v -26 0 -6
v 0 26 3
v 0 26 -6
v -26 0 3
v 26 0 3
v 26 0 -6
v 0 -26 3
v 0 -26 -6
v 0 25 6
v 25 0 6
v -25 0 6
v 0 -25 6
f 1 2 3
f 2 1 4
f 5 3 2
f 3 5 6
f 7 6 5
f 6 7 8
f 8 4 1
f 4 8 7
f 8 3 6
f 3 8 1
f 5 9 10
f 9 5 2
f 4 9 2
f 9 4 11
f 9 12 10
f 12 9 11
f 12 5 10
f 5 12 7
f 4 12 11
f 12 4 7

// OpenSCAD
$fn=4;
difference(){
!    union(){
        translate([0,0,-1.5]) cylinder(h=9, r=26, center=true);
        translate([0.0, 0.0, 6.0]) rotate([180, 0, 0]) cylinder(h=3, r1=25, r2=26);
    }
    cylinder(h=14, r=23.0, center=true);
}
